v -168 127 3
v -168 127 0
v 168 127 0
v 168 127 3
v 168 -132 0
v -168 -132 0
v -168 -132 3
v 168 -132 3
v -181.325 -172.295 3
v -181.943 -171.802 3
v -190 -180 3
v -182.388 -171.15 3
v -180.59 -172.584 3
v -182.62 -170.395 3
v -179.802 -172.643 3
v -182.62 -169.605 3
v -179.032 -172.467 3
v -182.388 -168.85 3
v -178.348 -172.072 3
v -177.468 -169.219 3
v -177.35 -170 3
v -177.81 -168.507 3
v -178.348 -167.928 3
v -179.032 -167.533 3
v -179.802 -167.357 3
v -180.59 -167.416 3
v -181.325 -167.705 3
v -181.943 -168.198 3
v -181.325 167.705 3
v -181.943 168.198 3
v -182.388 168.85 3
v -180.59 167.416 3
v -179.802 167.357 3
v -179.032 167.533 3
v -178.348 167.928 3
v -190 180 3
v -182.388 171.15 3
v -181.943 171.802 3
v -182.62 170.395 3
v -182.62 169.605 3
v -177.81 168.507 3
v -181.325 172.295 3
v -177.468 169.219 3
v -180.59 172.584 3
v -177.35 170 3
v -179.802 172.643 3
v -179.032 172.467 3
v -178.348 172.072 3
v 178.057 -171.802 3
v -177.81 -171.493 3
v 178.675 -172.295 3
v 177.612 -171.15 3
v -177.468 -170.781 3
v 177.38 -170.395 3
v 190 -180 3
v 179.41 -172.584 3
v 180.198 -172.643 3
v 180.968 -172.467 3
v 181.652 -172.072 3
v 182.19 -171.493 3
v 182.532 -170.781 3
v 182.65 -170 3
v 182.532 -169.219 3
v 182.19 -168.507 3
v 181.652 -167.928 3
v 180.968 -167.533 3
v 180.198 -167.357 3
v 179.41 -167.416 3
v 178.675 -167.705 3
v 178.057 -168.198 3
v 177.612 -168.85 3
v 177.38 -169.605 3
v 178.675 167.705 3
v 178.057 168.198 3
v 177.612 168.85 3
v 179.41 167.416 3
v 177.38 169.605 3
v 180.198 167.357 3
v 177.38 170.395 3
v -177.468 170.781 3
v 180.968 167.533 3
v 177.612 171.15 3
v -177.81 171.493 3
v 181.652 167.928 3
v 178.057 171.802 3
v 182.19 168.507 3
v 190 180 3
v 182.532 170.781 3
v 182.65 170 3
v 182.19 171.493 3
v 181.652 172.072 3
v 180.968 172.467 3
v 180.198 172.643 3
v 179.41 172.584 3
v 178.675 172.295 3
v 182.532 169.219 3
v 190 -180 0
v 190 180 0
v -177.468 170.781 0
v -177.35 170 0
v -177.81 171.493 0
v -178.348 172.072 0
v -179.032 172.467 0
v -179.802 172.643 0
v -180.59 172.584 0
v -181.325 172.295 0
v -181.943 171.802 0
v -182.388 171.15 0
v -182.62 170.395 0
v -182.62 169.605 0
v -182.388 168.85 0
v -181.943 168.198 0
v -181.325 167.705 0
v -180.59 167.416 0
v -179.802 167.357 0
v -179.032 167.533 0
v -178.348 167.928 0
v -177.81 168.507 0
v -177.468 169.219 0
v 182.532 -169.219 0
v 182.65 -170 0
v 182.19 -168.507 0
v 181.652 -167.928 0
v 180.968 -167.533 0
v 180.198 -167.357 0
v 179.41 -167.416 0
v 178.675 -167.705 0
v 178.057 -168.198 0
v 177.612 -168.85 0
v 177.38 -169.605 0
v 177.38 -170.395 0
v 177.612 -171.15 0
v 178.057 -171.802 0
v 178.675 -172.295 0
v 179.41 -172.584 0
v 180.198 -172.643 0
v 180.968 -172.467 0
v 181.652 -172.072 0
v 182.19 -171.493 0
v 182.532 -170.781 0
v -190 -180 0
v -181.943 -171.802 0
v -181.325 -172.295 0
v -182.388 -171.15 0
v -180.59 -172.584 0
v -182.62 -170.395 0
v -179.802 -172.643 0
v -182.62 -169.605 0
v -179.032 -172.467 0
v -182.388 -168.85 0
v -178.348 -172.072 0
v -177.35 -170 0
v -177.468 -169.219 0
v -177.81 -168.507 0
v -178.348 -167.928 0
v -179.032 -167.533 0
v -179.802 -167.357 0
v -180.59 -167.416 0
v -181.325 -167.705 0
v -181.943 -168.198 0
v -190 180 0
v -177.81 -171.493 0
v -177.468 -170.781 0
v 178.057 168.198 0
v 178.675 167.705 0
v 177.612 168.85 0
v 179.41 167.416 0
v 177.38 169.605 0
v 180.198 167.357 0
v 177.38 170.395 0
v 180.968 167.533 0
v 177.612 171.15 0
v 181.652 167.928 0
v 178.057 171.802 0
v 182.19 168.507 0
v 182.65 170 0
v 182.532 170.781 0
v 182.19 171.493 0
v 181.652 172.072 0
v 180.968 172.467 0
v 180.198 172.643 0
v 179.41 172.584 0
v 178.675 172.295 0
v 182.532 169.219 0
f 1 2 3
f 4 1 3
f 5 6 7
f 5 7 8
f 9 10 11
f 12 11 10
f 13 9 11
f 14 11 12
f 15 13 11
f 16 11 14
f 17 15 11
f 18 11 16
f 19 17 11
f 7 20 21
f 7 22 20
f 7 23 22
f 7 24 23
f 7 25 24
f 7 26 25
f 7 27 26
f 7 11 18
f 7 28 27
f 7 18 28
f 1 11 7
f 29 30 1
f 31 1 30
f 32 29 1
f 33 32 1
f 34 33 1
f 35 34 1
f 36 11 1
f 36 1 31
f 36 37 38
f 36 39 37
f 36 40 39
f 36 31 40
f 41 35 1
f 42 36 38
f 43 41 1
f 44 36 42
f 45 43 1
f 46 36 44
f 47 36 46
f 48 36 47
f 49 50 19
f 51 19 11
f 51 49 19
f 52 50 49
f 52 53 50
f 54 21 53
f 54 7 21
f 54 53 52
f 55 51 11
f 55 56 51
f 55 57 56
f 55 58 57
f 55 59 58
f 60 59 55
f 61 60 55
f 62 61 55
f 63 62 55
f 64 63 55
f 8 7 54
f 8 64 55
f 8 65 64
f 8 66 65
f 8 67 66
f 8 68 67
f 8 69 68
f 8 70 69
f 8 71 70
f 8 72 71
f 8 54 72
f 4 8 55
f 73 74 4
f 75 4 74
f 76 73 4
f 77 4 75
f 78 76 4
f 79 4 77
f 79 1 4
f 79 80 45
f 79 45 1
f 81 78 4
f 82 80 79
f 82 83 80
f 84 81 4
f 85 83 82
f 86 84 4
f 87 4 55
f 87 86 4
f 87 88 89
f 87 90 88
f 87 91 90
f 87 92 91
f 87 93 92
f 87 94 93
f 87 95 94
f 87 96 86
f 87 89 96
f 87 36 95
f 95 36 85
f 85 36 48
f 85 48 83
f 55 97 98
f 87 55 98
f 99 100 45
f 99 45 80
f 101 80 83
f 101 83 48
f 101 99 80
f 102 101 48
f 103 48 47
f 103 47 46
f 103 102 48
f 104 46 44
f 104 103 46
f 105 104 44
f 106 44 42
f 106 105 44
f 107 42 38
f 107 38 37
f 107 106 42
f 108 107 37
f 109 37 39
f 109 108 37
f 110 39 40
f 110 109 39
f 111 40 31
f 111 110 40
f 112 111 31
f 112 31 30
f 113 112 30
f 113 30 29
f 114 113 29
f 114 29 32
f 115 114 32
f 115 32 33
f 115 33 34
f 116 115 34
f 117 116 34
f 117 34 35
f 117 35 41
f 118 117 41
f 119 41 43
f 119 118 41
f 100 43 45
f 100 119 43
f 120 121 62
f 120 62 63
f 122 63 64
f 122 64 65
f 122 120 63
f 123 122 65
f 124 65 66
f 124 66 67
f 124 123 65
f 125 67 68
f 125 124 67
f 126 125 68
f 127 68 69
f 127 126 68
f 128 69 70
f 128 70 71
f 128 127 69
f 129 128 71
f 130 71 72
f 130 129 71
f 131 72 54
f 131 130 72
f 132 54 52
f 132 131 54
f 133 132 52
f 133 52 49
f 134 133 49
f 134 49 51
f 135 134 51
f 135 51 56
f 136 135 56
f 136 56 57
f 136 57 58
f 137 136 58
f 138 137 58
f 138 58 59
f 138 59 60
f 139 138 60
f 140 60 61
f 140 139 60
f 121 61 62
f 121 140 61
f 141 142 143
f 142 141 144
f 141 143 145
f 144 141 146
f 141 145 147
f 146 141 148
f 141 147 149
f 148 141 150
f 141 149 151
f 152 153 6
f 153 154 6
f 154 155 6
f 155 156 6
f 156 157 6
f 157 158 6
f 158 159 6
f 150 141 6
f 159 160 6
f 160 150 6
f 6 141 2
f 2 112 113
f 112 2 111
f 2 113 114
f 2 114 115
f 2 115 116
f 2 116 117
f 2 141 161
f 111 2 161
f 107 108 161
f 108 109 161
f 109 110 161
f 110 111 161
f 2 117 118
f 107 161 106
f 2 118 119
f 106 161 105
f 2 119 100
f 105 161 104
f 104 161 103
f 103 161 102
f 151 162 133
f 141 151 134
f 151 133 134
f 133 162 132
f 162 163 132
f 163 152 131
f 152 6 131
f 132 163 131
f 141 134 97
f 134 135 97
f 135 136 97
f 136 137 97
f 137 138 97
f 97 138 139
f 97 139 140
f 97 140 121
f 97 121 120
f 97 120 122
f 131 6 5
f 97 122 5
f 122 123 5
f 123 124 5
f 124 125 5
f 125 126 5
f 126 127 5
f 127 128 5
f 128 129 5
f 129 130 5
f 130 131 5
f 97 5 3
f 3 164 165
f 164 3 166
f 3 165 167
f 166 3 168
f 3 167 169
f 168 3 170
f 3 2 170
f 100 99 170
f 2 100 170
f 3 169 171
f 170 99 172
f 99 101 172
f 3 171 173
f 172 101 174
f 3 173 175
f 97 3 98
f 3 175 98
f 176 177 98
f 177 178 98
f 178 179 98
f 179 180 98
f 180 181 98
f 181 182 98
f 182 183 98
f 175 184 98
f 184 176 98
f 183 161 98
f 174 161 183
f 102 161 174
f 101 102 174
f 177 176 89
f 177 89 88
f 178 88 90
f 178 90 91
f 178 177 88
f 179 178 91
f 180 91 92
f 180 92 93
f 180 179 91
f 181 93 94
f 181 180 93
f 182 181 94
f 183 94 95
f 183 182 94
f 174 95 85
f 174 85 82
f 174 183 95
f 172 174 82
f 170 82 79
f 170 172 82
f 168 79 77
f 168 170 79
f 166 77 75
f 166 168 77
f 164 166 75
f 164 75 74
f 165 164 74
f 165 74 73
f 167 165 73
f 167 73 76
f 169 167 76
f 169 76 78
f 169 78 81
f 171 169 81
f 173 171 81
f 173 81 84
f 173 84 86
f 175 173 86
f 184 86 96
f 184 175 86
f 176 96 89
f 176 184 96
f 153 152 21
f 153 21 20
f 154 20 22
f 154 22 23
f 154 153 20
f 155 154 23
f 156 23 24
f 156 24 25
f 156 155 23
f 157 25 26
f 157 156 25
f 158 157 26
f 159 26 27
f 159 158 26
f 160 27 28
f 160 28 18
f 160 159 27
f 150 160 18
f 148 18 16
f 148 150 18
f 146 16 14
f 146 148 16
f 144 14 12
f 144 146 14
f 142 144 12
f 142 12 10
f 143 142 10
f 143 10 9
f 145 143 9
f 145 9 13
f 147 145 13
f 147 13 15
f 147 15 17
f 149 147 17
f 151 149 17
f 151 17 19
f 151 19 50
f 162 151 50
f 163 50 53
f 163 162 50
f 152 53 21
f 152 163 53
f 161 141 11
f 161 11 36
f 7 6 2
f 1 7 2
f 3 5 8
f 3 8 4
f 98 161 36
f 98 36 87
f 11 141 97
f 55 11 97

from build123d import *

# Parameters (mm, degrees)
F0_W     = 380
F0_H     = 360
F0_R     = 2.65
F0_W_2   = 336
F0_H_2   = 259
F1_DEPTH = 3


with BuildPart() as f1:
    # F0 (on Top) → F1 (new body)
    with BuildSketch(Plane.XY):
        Rectangle(F0_W, F0_H)
        with Locations((-180, -170)):
            Circle(F0_R, mode=Mode.SUBTRACT)
        with Locations((180, -170)):
            Circle(F0_R, mode=Mode.SUBTRACT)
        with Locations((0, -2.5)):
            Rectangle(F0_W_2, F0_H_2, mode=Mode.SUBTRACT)
        with Locations((-180, 170)):
            Circle(F0_R, mode=Mode.SUBTRACT)
        with Locations((180, 170)):
            Circle(F0_R, mode=Mode.SUBTRACT)
    extrude(amount=F1_DEPTH)


solid = f1.part
